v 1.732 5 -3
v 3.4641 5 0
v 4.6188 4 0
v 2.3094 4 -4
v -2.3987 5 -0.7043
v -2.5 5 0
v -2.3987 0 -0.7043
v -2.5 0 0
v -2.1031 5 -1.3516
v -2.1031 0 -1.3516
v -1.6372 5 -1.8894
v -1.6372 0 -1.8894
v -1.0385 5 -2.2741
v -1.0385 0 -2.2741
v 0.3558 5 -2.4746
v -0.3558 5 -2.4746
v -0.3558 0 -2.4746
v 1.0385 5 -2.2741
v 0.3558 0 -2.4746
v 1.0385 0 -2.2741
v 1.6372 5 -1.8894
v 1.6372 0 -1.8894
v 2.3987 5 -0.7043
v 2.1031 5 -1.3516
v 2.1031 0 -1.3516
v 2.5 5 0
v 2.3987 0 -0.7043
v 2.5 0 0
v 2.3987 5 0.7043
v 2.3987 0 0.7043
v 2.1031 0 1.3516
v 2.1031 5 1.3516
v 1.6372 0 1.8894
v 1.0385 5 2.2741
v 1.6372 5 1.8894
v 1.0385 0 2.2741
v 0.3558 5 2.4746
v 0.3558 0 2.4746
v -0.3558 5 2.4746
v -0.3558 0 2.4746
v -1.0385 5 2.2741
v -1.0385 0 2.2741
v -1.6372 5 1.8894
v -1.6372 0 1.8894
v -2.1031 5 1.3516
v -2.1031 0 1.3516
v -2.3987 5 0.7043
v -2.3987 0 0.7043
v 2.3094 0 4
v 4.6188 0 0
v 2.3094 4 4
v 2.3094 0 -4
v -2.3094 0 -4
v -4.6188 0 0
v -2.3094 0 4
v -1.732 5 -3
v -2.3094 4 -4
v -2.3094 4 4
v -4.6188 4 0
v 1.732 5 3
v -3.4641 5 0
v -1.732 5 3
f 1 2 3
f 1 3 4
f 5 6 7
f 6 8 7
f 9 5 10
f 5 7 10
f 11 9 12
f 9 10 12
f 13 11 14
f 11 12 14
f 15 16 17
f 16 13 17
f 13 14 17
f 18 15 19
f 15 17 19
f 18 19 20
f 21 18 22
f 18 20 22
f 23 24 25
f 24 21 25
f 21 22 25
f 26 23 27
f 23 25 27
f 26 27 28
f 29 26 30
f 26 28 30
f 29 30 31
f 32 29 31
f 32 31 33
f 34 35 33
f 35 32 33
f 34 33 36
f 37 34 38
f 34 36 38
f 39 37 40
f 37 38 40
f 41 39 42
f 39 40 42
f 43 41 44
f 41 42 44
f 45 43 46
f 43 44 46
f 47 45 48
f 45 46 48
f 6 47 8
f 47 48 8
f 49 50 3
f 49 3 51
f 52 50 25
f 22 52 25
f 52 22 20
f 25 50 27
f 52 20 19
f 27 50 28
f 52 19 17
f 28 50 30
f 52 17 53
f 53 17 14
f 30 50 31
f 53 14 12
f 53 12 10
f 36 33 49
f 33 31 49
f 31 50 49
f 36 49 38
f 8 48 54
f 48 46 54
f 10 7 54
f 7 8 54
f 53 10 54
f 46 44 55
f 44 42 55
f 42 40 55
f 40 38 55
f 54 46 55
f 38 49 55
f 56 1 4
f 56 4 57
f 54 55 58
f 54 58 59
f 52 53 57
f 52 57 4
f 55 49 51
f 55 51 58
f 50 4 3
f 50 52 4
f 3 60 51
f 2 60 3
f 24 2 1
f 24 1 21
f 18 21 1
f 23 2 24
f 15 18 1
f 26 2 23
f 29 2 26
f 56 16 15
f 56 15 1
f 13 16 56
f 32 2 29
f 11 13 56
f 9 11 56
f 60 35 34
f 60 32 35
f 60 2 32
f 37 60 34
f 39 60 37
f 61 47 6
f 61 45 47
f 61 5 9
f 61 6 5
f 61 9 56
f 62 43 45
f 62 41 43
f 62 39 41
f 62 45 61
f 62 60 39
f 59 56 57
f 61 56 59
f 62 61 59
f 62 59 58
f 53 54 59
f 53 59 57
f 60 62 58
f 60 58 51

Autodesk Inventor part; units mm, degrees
ref_plane "YZ Plane" through (0, 0, 0) normal (1, 0, 0) x (0, 1, 0)
ref_plane "XZ Plane" through (0, 0, 0) normal (0, 1, 0) x (-1, 0, 0)
ref_plane "XY Plane" through (0, 0, 0) normal (0, 0, 1) x (1, 0, 0)
sketch "Szkic1" plane through (0, 0, 0) normal (0, 1, 0) x (-1, 0, 0)
  line L0 (-2.3094, -4) -> (-4.6188, 0)
  line L1 (-4.6188, 0) -> (-2.3094, 4)
  line L2 (-2.3094, 4) -> (2.3094, 4)
  line L3 (2.3094, 4) -> (4.6188, 0)
  line L4 (4.6188, 0) -> (2.3094, -4)
  line L5 (2.3094, -4) -> (-2.3094, -4)
  circle A0 centre (0, 0) radius 2.5
  dimension "d0" = 8
  dimension "d1" = 5
extrude "Wyciągnięcie proste1" add sketch "Szkic1" along normal blind 5
thread "Gwint1" size "M6x1" class "6H" standard "ANSI Metric M Profile" length 5
chamfer "Faza1" distance 1 angle 45 6 edges at (-3.4641, 5, 2) (0, 5, 4) (3.4641, 5, 2) (3.4641, 5, -2) (0, 5, -4) (-3.4641, 5, -2)
properties part number "M5_nut_5mm" material "Aluminium 6061"
